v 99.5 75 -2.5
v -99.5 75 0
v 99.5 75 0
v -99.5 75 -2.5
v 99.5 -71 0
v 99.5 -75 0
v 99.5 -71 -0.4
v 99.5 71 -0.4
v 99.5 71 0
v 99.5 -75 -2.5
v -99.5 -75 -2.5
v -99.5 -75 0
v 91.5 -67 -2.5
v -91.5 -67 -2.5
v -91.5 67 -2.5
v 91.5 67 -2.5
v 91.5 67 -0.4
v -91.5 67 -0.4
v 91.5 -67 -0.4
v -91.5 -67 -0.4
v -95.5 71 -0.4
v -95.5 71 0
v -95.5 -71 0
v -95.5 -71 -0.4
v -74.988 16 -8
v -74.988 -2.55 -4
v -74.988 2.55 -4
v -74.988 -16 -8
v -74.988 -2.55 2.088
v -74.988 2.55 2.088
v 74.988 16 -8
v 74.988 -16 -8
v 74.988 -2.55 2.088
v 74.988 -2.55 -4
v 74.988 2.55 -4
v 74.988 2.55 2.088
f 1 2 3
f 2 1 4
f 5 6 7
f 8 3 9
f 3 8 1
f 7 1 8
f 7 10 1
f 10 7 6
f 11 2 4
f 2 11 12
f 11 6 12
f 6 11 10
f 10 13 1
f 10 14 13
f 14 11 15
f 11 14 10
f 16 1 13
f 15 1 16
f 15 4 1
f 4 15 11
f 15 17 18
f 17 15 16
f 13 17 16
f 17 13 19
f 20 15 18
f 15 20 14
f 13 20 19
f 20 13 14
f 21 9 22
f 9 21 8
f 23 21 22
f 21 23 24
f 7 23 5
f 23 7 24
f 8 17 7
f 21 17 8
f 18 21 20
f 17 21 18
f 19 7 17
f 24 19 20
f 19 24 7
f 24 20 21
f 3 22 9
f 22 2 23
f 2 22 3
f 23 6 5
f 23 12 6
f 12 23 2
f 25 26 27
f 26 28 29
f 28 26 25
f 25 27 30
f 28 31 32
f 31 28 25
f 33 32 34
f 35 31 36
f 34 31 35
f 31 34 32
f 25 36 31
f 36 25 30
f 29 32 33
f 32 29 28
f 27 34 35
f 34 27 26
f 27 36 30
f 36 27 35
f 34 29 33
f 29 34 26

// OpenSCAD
_pic = [142, 0.8, 191];
_p = 4; // Padding
_m = 4; // Margin
_t = 5; // Thickness

module pic() {
    color("#aaaaaa")
        cube(_pic, center = true);
}

module frame() {
    module window() {
        cube([_pic.x - _p * 2, _t * 2, _pic.z - _p * 2], center = true);
    }

    module frame() {
        cube([_pic.x + _m * 2, _t, _pic.z + _m * 2], center = true);
    }

    difference() {
        frame();

        window();

        // Slot
        pic();
        // Cutout on top
        translate([0, 0, _m * 2])
            pic();
    }
}

module base() {
    module frame() {
        cube([_pic.x + _m * 2, _t + 0.1, _pic.z + _m * 2], center = true);
    }

    difference() {
        rotate([90, 0, 90])
        linear_extrude(_pic.x + _m * 2 - 0.025, center = true)
            polygon([
                [- _m * 4, - _m * 2],
                [0, _p],
                [_m * 4, - _m * 2],
            ]);

        translate([0, 0, _pic.z / 2])
            frame();
    }
}


module export1() {
    intersection() {
        rotate([90, 0, 90])
            frame();

        translate([0, 0, -500])
            cube(1000, center = true);
    }
}

module export2() {
    base();
}


export1();
export2();
